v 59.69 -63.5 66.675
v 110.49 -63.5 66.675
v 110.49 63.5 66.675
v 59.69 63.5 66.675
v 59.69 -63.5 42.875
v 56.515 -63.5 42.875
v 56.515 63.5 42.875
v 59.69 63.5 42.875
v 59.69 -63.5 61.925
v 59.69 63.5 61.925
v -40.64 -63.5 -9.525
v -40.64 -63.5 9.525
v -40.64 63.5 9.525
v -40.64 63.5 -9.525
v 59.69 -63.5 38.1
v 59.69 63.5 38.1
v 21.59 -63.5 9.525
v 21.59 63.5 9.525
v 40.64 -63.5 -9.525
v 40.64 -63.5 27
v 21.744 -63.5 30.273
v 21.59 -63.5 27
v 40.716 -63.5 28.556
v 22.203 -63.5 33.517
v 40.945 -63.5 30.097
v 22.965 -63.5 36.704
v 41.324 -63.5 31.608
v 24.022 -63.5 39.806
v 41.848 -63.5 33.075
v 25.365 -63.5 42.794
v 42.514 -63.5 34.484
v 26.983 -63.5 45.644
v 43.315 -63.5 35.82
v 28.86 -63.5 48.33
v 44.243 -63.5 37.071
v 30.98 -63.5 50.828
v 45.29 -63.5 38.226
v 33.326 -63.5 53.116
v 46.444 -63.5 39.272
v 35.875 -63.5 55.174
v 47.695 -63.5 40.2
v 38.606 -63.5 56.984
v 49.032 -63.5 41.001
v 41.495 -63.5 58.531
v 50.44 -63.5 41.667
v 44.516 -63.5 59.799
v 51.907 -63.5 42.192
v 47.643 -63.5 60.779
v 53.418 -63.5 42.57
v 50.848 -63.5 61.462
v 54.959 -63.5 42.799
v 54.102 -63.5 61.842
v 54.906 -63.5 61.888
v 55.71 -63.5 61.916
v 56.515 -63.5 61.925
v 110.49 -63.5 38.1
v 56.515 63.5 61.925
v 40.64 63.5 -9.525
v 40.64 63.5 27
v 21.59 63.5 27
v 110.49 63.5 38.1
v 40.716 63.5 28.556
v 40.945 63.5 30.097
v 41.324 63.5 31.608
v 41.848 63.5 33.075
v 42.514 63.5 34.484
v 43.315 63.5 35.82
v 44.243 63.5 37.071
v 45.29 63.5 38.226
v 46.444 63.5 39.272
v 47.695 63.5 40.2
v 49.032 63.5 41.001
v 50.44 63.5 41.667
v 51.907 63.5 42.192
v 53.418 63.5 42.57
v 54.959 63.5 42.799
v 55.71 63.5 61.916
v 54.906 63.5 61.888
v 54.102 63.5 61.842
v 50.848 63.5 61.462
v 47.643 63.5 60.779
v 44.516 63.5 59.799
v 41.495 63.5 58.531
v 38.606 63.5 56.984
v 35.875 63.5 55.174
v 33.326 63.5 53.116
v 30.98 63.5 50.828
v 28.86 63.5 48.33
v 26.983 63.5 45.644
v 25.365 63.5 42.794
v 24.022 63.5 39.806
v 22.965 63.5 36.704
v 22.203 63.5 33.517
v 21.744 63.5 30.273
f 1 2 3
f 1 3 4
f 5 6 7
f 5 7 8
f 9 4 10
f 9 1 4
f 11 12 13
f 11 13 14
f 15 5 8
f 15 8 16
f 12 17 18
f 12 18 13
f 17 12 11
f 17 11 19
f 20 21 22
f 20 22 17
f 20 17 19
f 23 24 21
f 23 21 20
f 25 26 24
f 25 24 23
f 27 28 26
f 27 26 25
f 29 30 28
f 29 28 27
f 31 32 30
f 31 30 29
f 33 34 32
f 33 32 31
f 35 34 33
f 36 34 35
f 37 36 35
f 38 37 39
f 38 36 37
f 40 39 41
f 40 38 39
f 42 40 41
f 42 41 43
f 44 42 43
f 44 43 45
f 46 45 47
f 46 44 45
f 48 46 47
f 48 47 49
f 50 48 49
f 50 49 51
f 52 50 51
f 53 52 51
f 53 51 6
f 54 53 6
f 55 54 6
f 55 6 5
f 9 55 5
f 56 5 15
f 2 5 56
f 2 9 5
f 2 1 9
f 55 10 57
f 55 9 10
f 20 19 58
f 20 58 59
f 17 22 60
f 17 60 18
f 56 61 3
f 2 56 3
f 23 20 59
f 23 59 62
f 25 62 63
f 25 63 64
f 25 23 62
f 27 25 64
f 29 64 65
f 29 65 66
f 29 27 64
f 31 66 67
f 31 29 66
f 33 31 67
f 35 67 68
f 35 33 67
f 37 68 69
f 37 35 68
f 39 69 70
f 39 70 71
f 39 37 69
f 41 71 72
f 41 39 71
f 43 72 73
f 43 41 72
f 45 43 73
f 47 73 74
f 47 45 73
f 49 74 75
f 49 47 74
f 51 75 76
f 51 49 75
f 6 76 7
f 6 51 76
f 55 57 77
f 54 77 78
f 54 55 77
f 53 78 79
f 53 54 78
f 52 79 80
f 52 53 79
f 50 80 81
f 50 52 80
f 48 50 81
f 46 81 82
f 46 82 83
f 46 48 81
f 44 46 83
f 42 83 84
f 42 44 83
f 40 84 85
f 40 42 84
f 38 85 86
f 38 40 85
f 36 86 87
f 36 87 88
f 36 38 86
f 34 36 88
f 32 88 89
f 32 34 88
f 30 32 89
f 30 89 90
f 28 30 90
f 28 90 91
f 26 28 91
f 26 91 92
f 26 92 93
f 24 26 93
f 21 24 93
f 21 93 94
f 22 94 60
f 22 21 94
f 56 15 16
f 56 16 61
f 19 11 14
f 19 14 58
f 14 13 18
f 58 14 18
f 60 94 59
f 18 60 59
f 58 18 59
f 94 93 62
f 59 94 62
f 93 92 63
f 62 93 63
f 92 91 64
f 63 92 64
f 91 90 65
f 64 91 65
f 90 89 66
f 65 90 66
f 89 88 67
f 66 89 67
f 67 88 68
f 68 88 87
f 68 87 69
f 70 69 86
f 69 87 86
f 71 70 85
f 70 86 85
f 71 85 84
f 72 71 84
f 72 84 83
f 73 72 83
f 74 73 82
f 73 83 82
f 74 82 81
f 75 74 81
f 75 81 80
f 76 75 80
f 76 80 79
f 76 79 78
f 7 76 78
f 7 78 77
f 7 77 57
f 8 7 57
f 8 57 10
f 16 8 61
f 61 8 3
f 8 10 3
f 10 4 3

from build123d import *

# Parameters (mm, degrees)
F0_W     = 24.6055256037
F0_H     = 4.7752
F0_H_2   = 4.7498
F0_H_3   = 19.05
F1_DEPTH = 63.5


with BuildPart() as f1:
    # F0 (on Front) → F1 (new body, symmetric)
    with BuildSketch(Plane.XZ):
        with BuildLine():
            ThreePointArc((56.515, 61.9252), (55.3078445888, 61.9043315723), (54.1021317795, 61.8417512277))
            add(Edge.make_bspline(
                [(54.1021317795, 61.8417512277), (54.9069035944, 61.8717262764), (55.7112681225, 61.8994528512), (56.515, 61.9252)],
                knots=[108.1784271966, 108.1784271966, 108.1784271966, 108.1784271966, 110.3851212122, 110.3851212122, 110.3851212122, 110.3851212122], degree=3))
        make_face()
        Polygon((-40.64, -9.525), (40.64, -9.525), (40.64, 9.525), (21.59, 9.525), (-40.64, 9.525), align=None)
        with Locations((71.9927628018, 40.4876)):
            Rectangle(F0_W, F0_H)
        with Locations((71.9927628018, 64.3001)):
            Rectangle(F0_W, F0_H_2)
        Polygon((84.2955256037, 61.9252), (84.2955256037, 42.8752), (84.2955256037, 38.1), (110.49, 38.1), (110.49, 66.675), (84.2955256037, 66.675), align=None)
        with Locations((71.9927628018, 52.4002)):
            Rectangle(F0_W, F0_H_3)
        with BuildLine():
            Line((21.59, 9.525), (40.64, 9.525))
            Line((40.64, 9.525), (40.64, 27.0002))
            ThreePointArc((40.64, 27.0002), (45.2896798487, 38.2255201513), (56.515, 42.8752))
            Line((56.515, 42.8752), (59.69, 42.8752))
            Line((59.69, 42.8752), (59.69, 61.9252))
            Line((59.69, 61.9252), (56.515, 61.9252))
            add(Edge.make_bspline(
                [(54.1021317795, 61.8417512277), (54.9069035944, 61.8717262764), (55.7112681225, 61.8994528512), (56.515, 61.9252)],
                knots=[108.1784271966, 108.1784271966, 108.1784271966, 108.1784271966, 110.3851212122, 110.3851212122, 110.3851212122, 110.3851212122], degree=3))
            ThreePointArc((54.1021317795, 61.8417512277), (30.9804640966, 50.827560349), (21.59, 27.0002))
            Line((21.59, 27.0002), (21.59, 9.525))
        make_face()
    extrude(amount=F1_DEPTH, both=True)


solid = f1.part
